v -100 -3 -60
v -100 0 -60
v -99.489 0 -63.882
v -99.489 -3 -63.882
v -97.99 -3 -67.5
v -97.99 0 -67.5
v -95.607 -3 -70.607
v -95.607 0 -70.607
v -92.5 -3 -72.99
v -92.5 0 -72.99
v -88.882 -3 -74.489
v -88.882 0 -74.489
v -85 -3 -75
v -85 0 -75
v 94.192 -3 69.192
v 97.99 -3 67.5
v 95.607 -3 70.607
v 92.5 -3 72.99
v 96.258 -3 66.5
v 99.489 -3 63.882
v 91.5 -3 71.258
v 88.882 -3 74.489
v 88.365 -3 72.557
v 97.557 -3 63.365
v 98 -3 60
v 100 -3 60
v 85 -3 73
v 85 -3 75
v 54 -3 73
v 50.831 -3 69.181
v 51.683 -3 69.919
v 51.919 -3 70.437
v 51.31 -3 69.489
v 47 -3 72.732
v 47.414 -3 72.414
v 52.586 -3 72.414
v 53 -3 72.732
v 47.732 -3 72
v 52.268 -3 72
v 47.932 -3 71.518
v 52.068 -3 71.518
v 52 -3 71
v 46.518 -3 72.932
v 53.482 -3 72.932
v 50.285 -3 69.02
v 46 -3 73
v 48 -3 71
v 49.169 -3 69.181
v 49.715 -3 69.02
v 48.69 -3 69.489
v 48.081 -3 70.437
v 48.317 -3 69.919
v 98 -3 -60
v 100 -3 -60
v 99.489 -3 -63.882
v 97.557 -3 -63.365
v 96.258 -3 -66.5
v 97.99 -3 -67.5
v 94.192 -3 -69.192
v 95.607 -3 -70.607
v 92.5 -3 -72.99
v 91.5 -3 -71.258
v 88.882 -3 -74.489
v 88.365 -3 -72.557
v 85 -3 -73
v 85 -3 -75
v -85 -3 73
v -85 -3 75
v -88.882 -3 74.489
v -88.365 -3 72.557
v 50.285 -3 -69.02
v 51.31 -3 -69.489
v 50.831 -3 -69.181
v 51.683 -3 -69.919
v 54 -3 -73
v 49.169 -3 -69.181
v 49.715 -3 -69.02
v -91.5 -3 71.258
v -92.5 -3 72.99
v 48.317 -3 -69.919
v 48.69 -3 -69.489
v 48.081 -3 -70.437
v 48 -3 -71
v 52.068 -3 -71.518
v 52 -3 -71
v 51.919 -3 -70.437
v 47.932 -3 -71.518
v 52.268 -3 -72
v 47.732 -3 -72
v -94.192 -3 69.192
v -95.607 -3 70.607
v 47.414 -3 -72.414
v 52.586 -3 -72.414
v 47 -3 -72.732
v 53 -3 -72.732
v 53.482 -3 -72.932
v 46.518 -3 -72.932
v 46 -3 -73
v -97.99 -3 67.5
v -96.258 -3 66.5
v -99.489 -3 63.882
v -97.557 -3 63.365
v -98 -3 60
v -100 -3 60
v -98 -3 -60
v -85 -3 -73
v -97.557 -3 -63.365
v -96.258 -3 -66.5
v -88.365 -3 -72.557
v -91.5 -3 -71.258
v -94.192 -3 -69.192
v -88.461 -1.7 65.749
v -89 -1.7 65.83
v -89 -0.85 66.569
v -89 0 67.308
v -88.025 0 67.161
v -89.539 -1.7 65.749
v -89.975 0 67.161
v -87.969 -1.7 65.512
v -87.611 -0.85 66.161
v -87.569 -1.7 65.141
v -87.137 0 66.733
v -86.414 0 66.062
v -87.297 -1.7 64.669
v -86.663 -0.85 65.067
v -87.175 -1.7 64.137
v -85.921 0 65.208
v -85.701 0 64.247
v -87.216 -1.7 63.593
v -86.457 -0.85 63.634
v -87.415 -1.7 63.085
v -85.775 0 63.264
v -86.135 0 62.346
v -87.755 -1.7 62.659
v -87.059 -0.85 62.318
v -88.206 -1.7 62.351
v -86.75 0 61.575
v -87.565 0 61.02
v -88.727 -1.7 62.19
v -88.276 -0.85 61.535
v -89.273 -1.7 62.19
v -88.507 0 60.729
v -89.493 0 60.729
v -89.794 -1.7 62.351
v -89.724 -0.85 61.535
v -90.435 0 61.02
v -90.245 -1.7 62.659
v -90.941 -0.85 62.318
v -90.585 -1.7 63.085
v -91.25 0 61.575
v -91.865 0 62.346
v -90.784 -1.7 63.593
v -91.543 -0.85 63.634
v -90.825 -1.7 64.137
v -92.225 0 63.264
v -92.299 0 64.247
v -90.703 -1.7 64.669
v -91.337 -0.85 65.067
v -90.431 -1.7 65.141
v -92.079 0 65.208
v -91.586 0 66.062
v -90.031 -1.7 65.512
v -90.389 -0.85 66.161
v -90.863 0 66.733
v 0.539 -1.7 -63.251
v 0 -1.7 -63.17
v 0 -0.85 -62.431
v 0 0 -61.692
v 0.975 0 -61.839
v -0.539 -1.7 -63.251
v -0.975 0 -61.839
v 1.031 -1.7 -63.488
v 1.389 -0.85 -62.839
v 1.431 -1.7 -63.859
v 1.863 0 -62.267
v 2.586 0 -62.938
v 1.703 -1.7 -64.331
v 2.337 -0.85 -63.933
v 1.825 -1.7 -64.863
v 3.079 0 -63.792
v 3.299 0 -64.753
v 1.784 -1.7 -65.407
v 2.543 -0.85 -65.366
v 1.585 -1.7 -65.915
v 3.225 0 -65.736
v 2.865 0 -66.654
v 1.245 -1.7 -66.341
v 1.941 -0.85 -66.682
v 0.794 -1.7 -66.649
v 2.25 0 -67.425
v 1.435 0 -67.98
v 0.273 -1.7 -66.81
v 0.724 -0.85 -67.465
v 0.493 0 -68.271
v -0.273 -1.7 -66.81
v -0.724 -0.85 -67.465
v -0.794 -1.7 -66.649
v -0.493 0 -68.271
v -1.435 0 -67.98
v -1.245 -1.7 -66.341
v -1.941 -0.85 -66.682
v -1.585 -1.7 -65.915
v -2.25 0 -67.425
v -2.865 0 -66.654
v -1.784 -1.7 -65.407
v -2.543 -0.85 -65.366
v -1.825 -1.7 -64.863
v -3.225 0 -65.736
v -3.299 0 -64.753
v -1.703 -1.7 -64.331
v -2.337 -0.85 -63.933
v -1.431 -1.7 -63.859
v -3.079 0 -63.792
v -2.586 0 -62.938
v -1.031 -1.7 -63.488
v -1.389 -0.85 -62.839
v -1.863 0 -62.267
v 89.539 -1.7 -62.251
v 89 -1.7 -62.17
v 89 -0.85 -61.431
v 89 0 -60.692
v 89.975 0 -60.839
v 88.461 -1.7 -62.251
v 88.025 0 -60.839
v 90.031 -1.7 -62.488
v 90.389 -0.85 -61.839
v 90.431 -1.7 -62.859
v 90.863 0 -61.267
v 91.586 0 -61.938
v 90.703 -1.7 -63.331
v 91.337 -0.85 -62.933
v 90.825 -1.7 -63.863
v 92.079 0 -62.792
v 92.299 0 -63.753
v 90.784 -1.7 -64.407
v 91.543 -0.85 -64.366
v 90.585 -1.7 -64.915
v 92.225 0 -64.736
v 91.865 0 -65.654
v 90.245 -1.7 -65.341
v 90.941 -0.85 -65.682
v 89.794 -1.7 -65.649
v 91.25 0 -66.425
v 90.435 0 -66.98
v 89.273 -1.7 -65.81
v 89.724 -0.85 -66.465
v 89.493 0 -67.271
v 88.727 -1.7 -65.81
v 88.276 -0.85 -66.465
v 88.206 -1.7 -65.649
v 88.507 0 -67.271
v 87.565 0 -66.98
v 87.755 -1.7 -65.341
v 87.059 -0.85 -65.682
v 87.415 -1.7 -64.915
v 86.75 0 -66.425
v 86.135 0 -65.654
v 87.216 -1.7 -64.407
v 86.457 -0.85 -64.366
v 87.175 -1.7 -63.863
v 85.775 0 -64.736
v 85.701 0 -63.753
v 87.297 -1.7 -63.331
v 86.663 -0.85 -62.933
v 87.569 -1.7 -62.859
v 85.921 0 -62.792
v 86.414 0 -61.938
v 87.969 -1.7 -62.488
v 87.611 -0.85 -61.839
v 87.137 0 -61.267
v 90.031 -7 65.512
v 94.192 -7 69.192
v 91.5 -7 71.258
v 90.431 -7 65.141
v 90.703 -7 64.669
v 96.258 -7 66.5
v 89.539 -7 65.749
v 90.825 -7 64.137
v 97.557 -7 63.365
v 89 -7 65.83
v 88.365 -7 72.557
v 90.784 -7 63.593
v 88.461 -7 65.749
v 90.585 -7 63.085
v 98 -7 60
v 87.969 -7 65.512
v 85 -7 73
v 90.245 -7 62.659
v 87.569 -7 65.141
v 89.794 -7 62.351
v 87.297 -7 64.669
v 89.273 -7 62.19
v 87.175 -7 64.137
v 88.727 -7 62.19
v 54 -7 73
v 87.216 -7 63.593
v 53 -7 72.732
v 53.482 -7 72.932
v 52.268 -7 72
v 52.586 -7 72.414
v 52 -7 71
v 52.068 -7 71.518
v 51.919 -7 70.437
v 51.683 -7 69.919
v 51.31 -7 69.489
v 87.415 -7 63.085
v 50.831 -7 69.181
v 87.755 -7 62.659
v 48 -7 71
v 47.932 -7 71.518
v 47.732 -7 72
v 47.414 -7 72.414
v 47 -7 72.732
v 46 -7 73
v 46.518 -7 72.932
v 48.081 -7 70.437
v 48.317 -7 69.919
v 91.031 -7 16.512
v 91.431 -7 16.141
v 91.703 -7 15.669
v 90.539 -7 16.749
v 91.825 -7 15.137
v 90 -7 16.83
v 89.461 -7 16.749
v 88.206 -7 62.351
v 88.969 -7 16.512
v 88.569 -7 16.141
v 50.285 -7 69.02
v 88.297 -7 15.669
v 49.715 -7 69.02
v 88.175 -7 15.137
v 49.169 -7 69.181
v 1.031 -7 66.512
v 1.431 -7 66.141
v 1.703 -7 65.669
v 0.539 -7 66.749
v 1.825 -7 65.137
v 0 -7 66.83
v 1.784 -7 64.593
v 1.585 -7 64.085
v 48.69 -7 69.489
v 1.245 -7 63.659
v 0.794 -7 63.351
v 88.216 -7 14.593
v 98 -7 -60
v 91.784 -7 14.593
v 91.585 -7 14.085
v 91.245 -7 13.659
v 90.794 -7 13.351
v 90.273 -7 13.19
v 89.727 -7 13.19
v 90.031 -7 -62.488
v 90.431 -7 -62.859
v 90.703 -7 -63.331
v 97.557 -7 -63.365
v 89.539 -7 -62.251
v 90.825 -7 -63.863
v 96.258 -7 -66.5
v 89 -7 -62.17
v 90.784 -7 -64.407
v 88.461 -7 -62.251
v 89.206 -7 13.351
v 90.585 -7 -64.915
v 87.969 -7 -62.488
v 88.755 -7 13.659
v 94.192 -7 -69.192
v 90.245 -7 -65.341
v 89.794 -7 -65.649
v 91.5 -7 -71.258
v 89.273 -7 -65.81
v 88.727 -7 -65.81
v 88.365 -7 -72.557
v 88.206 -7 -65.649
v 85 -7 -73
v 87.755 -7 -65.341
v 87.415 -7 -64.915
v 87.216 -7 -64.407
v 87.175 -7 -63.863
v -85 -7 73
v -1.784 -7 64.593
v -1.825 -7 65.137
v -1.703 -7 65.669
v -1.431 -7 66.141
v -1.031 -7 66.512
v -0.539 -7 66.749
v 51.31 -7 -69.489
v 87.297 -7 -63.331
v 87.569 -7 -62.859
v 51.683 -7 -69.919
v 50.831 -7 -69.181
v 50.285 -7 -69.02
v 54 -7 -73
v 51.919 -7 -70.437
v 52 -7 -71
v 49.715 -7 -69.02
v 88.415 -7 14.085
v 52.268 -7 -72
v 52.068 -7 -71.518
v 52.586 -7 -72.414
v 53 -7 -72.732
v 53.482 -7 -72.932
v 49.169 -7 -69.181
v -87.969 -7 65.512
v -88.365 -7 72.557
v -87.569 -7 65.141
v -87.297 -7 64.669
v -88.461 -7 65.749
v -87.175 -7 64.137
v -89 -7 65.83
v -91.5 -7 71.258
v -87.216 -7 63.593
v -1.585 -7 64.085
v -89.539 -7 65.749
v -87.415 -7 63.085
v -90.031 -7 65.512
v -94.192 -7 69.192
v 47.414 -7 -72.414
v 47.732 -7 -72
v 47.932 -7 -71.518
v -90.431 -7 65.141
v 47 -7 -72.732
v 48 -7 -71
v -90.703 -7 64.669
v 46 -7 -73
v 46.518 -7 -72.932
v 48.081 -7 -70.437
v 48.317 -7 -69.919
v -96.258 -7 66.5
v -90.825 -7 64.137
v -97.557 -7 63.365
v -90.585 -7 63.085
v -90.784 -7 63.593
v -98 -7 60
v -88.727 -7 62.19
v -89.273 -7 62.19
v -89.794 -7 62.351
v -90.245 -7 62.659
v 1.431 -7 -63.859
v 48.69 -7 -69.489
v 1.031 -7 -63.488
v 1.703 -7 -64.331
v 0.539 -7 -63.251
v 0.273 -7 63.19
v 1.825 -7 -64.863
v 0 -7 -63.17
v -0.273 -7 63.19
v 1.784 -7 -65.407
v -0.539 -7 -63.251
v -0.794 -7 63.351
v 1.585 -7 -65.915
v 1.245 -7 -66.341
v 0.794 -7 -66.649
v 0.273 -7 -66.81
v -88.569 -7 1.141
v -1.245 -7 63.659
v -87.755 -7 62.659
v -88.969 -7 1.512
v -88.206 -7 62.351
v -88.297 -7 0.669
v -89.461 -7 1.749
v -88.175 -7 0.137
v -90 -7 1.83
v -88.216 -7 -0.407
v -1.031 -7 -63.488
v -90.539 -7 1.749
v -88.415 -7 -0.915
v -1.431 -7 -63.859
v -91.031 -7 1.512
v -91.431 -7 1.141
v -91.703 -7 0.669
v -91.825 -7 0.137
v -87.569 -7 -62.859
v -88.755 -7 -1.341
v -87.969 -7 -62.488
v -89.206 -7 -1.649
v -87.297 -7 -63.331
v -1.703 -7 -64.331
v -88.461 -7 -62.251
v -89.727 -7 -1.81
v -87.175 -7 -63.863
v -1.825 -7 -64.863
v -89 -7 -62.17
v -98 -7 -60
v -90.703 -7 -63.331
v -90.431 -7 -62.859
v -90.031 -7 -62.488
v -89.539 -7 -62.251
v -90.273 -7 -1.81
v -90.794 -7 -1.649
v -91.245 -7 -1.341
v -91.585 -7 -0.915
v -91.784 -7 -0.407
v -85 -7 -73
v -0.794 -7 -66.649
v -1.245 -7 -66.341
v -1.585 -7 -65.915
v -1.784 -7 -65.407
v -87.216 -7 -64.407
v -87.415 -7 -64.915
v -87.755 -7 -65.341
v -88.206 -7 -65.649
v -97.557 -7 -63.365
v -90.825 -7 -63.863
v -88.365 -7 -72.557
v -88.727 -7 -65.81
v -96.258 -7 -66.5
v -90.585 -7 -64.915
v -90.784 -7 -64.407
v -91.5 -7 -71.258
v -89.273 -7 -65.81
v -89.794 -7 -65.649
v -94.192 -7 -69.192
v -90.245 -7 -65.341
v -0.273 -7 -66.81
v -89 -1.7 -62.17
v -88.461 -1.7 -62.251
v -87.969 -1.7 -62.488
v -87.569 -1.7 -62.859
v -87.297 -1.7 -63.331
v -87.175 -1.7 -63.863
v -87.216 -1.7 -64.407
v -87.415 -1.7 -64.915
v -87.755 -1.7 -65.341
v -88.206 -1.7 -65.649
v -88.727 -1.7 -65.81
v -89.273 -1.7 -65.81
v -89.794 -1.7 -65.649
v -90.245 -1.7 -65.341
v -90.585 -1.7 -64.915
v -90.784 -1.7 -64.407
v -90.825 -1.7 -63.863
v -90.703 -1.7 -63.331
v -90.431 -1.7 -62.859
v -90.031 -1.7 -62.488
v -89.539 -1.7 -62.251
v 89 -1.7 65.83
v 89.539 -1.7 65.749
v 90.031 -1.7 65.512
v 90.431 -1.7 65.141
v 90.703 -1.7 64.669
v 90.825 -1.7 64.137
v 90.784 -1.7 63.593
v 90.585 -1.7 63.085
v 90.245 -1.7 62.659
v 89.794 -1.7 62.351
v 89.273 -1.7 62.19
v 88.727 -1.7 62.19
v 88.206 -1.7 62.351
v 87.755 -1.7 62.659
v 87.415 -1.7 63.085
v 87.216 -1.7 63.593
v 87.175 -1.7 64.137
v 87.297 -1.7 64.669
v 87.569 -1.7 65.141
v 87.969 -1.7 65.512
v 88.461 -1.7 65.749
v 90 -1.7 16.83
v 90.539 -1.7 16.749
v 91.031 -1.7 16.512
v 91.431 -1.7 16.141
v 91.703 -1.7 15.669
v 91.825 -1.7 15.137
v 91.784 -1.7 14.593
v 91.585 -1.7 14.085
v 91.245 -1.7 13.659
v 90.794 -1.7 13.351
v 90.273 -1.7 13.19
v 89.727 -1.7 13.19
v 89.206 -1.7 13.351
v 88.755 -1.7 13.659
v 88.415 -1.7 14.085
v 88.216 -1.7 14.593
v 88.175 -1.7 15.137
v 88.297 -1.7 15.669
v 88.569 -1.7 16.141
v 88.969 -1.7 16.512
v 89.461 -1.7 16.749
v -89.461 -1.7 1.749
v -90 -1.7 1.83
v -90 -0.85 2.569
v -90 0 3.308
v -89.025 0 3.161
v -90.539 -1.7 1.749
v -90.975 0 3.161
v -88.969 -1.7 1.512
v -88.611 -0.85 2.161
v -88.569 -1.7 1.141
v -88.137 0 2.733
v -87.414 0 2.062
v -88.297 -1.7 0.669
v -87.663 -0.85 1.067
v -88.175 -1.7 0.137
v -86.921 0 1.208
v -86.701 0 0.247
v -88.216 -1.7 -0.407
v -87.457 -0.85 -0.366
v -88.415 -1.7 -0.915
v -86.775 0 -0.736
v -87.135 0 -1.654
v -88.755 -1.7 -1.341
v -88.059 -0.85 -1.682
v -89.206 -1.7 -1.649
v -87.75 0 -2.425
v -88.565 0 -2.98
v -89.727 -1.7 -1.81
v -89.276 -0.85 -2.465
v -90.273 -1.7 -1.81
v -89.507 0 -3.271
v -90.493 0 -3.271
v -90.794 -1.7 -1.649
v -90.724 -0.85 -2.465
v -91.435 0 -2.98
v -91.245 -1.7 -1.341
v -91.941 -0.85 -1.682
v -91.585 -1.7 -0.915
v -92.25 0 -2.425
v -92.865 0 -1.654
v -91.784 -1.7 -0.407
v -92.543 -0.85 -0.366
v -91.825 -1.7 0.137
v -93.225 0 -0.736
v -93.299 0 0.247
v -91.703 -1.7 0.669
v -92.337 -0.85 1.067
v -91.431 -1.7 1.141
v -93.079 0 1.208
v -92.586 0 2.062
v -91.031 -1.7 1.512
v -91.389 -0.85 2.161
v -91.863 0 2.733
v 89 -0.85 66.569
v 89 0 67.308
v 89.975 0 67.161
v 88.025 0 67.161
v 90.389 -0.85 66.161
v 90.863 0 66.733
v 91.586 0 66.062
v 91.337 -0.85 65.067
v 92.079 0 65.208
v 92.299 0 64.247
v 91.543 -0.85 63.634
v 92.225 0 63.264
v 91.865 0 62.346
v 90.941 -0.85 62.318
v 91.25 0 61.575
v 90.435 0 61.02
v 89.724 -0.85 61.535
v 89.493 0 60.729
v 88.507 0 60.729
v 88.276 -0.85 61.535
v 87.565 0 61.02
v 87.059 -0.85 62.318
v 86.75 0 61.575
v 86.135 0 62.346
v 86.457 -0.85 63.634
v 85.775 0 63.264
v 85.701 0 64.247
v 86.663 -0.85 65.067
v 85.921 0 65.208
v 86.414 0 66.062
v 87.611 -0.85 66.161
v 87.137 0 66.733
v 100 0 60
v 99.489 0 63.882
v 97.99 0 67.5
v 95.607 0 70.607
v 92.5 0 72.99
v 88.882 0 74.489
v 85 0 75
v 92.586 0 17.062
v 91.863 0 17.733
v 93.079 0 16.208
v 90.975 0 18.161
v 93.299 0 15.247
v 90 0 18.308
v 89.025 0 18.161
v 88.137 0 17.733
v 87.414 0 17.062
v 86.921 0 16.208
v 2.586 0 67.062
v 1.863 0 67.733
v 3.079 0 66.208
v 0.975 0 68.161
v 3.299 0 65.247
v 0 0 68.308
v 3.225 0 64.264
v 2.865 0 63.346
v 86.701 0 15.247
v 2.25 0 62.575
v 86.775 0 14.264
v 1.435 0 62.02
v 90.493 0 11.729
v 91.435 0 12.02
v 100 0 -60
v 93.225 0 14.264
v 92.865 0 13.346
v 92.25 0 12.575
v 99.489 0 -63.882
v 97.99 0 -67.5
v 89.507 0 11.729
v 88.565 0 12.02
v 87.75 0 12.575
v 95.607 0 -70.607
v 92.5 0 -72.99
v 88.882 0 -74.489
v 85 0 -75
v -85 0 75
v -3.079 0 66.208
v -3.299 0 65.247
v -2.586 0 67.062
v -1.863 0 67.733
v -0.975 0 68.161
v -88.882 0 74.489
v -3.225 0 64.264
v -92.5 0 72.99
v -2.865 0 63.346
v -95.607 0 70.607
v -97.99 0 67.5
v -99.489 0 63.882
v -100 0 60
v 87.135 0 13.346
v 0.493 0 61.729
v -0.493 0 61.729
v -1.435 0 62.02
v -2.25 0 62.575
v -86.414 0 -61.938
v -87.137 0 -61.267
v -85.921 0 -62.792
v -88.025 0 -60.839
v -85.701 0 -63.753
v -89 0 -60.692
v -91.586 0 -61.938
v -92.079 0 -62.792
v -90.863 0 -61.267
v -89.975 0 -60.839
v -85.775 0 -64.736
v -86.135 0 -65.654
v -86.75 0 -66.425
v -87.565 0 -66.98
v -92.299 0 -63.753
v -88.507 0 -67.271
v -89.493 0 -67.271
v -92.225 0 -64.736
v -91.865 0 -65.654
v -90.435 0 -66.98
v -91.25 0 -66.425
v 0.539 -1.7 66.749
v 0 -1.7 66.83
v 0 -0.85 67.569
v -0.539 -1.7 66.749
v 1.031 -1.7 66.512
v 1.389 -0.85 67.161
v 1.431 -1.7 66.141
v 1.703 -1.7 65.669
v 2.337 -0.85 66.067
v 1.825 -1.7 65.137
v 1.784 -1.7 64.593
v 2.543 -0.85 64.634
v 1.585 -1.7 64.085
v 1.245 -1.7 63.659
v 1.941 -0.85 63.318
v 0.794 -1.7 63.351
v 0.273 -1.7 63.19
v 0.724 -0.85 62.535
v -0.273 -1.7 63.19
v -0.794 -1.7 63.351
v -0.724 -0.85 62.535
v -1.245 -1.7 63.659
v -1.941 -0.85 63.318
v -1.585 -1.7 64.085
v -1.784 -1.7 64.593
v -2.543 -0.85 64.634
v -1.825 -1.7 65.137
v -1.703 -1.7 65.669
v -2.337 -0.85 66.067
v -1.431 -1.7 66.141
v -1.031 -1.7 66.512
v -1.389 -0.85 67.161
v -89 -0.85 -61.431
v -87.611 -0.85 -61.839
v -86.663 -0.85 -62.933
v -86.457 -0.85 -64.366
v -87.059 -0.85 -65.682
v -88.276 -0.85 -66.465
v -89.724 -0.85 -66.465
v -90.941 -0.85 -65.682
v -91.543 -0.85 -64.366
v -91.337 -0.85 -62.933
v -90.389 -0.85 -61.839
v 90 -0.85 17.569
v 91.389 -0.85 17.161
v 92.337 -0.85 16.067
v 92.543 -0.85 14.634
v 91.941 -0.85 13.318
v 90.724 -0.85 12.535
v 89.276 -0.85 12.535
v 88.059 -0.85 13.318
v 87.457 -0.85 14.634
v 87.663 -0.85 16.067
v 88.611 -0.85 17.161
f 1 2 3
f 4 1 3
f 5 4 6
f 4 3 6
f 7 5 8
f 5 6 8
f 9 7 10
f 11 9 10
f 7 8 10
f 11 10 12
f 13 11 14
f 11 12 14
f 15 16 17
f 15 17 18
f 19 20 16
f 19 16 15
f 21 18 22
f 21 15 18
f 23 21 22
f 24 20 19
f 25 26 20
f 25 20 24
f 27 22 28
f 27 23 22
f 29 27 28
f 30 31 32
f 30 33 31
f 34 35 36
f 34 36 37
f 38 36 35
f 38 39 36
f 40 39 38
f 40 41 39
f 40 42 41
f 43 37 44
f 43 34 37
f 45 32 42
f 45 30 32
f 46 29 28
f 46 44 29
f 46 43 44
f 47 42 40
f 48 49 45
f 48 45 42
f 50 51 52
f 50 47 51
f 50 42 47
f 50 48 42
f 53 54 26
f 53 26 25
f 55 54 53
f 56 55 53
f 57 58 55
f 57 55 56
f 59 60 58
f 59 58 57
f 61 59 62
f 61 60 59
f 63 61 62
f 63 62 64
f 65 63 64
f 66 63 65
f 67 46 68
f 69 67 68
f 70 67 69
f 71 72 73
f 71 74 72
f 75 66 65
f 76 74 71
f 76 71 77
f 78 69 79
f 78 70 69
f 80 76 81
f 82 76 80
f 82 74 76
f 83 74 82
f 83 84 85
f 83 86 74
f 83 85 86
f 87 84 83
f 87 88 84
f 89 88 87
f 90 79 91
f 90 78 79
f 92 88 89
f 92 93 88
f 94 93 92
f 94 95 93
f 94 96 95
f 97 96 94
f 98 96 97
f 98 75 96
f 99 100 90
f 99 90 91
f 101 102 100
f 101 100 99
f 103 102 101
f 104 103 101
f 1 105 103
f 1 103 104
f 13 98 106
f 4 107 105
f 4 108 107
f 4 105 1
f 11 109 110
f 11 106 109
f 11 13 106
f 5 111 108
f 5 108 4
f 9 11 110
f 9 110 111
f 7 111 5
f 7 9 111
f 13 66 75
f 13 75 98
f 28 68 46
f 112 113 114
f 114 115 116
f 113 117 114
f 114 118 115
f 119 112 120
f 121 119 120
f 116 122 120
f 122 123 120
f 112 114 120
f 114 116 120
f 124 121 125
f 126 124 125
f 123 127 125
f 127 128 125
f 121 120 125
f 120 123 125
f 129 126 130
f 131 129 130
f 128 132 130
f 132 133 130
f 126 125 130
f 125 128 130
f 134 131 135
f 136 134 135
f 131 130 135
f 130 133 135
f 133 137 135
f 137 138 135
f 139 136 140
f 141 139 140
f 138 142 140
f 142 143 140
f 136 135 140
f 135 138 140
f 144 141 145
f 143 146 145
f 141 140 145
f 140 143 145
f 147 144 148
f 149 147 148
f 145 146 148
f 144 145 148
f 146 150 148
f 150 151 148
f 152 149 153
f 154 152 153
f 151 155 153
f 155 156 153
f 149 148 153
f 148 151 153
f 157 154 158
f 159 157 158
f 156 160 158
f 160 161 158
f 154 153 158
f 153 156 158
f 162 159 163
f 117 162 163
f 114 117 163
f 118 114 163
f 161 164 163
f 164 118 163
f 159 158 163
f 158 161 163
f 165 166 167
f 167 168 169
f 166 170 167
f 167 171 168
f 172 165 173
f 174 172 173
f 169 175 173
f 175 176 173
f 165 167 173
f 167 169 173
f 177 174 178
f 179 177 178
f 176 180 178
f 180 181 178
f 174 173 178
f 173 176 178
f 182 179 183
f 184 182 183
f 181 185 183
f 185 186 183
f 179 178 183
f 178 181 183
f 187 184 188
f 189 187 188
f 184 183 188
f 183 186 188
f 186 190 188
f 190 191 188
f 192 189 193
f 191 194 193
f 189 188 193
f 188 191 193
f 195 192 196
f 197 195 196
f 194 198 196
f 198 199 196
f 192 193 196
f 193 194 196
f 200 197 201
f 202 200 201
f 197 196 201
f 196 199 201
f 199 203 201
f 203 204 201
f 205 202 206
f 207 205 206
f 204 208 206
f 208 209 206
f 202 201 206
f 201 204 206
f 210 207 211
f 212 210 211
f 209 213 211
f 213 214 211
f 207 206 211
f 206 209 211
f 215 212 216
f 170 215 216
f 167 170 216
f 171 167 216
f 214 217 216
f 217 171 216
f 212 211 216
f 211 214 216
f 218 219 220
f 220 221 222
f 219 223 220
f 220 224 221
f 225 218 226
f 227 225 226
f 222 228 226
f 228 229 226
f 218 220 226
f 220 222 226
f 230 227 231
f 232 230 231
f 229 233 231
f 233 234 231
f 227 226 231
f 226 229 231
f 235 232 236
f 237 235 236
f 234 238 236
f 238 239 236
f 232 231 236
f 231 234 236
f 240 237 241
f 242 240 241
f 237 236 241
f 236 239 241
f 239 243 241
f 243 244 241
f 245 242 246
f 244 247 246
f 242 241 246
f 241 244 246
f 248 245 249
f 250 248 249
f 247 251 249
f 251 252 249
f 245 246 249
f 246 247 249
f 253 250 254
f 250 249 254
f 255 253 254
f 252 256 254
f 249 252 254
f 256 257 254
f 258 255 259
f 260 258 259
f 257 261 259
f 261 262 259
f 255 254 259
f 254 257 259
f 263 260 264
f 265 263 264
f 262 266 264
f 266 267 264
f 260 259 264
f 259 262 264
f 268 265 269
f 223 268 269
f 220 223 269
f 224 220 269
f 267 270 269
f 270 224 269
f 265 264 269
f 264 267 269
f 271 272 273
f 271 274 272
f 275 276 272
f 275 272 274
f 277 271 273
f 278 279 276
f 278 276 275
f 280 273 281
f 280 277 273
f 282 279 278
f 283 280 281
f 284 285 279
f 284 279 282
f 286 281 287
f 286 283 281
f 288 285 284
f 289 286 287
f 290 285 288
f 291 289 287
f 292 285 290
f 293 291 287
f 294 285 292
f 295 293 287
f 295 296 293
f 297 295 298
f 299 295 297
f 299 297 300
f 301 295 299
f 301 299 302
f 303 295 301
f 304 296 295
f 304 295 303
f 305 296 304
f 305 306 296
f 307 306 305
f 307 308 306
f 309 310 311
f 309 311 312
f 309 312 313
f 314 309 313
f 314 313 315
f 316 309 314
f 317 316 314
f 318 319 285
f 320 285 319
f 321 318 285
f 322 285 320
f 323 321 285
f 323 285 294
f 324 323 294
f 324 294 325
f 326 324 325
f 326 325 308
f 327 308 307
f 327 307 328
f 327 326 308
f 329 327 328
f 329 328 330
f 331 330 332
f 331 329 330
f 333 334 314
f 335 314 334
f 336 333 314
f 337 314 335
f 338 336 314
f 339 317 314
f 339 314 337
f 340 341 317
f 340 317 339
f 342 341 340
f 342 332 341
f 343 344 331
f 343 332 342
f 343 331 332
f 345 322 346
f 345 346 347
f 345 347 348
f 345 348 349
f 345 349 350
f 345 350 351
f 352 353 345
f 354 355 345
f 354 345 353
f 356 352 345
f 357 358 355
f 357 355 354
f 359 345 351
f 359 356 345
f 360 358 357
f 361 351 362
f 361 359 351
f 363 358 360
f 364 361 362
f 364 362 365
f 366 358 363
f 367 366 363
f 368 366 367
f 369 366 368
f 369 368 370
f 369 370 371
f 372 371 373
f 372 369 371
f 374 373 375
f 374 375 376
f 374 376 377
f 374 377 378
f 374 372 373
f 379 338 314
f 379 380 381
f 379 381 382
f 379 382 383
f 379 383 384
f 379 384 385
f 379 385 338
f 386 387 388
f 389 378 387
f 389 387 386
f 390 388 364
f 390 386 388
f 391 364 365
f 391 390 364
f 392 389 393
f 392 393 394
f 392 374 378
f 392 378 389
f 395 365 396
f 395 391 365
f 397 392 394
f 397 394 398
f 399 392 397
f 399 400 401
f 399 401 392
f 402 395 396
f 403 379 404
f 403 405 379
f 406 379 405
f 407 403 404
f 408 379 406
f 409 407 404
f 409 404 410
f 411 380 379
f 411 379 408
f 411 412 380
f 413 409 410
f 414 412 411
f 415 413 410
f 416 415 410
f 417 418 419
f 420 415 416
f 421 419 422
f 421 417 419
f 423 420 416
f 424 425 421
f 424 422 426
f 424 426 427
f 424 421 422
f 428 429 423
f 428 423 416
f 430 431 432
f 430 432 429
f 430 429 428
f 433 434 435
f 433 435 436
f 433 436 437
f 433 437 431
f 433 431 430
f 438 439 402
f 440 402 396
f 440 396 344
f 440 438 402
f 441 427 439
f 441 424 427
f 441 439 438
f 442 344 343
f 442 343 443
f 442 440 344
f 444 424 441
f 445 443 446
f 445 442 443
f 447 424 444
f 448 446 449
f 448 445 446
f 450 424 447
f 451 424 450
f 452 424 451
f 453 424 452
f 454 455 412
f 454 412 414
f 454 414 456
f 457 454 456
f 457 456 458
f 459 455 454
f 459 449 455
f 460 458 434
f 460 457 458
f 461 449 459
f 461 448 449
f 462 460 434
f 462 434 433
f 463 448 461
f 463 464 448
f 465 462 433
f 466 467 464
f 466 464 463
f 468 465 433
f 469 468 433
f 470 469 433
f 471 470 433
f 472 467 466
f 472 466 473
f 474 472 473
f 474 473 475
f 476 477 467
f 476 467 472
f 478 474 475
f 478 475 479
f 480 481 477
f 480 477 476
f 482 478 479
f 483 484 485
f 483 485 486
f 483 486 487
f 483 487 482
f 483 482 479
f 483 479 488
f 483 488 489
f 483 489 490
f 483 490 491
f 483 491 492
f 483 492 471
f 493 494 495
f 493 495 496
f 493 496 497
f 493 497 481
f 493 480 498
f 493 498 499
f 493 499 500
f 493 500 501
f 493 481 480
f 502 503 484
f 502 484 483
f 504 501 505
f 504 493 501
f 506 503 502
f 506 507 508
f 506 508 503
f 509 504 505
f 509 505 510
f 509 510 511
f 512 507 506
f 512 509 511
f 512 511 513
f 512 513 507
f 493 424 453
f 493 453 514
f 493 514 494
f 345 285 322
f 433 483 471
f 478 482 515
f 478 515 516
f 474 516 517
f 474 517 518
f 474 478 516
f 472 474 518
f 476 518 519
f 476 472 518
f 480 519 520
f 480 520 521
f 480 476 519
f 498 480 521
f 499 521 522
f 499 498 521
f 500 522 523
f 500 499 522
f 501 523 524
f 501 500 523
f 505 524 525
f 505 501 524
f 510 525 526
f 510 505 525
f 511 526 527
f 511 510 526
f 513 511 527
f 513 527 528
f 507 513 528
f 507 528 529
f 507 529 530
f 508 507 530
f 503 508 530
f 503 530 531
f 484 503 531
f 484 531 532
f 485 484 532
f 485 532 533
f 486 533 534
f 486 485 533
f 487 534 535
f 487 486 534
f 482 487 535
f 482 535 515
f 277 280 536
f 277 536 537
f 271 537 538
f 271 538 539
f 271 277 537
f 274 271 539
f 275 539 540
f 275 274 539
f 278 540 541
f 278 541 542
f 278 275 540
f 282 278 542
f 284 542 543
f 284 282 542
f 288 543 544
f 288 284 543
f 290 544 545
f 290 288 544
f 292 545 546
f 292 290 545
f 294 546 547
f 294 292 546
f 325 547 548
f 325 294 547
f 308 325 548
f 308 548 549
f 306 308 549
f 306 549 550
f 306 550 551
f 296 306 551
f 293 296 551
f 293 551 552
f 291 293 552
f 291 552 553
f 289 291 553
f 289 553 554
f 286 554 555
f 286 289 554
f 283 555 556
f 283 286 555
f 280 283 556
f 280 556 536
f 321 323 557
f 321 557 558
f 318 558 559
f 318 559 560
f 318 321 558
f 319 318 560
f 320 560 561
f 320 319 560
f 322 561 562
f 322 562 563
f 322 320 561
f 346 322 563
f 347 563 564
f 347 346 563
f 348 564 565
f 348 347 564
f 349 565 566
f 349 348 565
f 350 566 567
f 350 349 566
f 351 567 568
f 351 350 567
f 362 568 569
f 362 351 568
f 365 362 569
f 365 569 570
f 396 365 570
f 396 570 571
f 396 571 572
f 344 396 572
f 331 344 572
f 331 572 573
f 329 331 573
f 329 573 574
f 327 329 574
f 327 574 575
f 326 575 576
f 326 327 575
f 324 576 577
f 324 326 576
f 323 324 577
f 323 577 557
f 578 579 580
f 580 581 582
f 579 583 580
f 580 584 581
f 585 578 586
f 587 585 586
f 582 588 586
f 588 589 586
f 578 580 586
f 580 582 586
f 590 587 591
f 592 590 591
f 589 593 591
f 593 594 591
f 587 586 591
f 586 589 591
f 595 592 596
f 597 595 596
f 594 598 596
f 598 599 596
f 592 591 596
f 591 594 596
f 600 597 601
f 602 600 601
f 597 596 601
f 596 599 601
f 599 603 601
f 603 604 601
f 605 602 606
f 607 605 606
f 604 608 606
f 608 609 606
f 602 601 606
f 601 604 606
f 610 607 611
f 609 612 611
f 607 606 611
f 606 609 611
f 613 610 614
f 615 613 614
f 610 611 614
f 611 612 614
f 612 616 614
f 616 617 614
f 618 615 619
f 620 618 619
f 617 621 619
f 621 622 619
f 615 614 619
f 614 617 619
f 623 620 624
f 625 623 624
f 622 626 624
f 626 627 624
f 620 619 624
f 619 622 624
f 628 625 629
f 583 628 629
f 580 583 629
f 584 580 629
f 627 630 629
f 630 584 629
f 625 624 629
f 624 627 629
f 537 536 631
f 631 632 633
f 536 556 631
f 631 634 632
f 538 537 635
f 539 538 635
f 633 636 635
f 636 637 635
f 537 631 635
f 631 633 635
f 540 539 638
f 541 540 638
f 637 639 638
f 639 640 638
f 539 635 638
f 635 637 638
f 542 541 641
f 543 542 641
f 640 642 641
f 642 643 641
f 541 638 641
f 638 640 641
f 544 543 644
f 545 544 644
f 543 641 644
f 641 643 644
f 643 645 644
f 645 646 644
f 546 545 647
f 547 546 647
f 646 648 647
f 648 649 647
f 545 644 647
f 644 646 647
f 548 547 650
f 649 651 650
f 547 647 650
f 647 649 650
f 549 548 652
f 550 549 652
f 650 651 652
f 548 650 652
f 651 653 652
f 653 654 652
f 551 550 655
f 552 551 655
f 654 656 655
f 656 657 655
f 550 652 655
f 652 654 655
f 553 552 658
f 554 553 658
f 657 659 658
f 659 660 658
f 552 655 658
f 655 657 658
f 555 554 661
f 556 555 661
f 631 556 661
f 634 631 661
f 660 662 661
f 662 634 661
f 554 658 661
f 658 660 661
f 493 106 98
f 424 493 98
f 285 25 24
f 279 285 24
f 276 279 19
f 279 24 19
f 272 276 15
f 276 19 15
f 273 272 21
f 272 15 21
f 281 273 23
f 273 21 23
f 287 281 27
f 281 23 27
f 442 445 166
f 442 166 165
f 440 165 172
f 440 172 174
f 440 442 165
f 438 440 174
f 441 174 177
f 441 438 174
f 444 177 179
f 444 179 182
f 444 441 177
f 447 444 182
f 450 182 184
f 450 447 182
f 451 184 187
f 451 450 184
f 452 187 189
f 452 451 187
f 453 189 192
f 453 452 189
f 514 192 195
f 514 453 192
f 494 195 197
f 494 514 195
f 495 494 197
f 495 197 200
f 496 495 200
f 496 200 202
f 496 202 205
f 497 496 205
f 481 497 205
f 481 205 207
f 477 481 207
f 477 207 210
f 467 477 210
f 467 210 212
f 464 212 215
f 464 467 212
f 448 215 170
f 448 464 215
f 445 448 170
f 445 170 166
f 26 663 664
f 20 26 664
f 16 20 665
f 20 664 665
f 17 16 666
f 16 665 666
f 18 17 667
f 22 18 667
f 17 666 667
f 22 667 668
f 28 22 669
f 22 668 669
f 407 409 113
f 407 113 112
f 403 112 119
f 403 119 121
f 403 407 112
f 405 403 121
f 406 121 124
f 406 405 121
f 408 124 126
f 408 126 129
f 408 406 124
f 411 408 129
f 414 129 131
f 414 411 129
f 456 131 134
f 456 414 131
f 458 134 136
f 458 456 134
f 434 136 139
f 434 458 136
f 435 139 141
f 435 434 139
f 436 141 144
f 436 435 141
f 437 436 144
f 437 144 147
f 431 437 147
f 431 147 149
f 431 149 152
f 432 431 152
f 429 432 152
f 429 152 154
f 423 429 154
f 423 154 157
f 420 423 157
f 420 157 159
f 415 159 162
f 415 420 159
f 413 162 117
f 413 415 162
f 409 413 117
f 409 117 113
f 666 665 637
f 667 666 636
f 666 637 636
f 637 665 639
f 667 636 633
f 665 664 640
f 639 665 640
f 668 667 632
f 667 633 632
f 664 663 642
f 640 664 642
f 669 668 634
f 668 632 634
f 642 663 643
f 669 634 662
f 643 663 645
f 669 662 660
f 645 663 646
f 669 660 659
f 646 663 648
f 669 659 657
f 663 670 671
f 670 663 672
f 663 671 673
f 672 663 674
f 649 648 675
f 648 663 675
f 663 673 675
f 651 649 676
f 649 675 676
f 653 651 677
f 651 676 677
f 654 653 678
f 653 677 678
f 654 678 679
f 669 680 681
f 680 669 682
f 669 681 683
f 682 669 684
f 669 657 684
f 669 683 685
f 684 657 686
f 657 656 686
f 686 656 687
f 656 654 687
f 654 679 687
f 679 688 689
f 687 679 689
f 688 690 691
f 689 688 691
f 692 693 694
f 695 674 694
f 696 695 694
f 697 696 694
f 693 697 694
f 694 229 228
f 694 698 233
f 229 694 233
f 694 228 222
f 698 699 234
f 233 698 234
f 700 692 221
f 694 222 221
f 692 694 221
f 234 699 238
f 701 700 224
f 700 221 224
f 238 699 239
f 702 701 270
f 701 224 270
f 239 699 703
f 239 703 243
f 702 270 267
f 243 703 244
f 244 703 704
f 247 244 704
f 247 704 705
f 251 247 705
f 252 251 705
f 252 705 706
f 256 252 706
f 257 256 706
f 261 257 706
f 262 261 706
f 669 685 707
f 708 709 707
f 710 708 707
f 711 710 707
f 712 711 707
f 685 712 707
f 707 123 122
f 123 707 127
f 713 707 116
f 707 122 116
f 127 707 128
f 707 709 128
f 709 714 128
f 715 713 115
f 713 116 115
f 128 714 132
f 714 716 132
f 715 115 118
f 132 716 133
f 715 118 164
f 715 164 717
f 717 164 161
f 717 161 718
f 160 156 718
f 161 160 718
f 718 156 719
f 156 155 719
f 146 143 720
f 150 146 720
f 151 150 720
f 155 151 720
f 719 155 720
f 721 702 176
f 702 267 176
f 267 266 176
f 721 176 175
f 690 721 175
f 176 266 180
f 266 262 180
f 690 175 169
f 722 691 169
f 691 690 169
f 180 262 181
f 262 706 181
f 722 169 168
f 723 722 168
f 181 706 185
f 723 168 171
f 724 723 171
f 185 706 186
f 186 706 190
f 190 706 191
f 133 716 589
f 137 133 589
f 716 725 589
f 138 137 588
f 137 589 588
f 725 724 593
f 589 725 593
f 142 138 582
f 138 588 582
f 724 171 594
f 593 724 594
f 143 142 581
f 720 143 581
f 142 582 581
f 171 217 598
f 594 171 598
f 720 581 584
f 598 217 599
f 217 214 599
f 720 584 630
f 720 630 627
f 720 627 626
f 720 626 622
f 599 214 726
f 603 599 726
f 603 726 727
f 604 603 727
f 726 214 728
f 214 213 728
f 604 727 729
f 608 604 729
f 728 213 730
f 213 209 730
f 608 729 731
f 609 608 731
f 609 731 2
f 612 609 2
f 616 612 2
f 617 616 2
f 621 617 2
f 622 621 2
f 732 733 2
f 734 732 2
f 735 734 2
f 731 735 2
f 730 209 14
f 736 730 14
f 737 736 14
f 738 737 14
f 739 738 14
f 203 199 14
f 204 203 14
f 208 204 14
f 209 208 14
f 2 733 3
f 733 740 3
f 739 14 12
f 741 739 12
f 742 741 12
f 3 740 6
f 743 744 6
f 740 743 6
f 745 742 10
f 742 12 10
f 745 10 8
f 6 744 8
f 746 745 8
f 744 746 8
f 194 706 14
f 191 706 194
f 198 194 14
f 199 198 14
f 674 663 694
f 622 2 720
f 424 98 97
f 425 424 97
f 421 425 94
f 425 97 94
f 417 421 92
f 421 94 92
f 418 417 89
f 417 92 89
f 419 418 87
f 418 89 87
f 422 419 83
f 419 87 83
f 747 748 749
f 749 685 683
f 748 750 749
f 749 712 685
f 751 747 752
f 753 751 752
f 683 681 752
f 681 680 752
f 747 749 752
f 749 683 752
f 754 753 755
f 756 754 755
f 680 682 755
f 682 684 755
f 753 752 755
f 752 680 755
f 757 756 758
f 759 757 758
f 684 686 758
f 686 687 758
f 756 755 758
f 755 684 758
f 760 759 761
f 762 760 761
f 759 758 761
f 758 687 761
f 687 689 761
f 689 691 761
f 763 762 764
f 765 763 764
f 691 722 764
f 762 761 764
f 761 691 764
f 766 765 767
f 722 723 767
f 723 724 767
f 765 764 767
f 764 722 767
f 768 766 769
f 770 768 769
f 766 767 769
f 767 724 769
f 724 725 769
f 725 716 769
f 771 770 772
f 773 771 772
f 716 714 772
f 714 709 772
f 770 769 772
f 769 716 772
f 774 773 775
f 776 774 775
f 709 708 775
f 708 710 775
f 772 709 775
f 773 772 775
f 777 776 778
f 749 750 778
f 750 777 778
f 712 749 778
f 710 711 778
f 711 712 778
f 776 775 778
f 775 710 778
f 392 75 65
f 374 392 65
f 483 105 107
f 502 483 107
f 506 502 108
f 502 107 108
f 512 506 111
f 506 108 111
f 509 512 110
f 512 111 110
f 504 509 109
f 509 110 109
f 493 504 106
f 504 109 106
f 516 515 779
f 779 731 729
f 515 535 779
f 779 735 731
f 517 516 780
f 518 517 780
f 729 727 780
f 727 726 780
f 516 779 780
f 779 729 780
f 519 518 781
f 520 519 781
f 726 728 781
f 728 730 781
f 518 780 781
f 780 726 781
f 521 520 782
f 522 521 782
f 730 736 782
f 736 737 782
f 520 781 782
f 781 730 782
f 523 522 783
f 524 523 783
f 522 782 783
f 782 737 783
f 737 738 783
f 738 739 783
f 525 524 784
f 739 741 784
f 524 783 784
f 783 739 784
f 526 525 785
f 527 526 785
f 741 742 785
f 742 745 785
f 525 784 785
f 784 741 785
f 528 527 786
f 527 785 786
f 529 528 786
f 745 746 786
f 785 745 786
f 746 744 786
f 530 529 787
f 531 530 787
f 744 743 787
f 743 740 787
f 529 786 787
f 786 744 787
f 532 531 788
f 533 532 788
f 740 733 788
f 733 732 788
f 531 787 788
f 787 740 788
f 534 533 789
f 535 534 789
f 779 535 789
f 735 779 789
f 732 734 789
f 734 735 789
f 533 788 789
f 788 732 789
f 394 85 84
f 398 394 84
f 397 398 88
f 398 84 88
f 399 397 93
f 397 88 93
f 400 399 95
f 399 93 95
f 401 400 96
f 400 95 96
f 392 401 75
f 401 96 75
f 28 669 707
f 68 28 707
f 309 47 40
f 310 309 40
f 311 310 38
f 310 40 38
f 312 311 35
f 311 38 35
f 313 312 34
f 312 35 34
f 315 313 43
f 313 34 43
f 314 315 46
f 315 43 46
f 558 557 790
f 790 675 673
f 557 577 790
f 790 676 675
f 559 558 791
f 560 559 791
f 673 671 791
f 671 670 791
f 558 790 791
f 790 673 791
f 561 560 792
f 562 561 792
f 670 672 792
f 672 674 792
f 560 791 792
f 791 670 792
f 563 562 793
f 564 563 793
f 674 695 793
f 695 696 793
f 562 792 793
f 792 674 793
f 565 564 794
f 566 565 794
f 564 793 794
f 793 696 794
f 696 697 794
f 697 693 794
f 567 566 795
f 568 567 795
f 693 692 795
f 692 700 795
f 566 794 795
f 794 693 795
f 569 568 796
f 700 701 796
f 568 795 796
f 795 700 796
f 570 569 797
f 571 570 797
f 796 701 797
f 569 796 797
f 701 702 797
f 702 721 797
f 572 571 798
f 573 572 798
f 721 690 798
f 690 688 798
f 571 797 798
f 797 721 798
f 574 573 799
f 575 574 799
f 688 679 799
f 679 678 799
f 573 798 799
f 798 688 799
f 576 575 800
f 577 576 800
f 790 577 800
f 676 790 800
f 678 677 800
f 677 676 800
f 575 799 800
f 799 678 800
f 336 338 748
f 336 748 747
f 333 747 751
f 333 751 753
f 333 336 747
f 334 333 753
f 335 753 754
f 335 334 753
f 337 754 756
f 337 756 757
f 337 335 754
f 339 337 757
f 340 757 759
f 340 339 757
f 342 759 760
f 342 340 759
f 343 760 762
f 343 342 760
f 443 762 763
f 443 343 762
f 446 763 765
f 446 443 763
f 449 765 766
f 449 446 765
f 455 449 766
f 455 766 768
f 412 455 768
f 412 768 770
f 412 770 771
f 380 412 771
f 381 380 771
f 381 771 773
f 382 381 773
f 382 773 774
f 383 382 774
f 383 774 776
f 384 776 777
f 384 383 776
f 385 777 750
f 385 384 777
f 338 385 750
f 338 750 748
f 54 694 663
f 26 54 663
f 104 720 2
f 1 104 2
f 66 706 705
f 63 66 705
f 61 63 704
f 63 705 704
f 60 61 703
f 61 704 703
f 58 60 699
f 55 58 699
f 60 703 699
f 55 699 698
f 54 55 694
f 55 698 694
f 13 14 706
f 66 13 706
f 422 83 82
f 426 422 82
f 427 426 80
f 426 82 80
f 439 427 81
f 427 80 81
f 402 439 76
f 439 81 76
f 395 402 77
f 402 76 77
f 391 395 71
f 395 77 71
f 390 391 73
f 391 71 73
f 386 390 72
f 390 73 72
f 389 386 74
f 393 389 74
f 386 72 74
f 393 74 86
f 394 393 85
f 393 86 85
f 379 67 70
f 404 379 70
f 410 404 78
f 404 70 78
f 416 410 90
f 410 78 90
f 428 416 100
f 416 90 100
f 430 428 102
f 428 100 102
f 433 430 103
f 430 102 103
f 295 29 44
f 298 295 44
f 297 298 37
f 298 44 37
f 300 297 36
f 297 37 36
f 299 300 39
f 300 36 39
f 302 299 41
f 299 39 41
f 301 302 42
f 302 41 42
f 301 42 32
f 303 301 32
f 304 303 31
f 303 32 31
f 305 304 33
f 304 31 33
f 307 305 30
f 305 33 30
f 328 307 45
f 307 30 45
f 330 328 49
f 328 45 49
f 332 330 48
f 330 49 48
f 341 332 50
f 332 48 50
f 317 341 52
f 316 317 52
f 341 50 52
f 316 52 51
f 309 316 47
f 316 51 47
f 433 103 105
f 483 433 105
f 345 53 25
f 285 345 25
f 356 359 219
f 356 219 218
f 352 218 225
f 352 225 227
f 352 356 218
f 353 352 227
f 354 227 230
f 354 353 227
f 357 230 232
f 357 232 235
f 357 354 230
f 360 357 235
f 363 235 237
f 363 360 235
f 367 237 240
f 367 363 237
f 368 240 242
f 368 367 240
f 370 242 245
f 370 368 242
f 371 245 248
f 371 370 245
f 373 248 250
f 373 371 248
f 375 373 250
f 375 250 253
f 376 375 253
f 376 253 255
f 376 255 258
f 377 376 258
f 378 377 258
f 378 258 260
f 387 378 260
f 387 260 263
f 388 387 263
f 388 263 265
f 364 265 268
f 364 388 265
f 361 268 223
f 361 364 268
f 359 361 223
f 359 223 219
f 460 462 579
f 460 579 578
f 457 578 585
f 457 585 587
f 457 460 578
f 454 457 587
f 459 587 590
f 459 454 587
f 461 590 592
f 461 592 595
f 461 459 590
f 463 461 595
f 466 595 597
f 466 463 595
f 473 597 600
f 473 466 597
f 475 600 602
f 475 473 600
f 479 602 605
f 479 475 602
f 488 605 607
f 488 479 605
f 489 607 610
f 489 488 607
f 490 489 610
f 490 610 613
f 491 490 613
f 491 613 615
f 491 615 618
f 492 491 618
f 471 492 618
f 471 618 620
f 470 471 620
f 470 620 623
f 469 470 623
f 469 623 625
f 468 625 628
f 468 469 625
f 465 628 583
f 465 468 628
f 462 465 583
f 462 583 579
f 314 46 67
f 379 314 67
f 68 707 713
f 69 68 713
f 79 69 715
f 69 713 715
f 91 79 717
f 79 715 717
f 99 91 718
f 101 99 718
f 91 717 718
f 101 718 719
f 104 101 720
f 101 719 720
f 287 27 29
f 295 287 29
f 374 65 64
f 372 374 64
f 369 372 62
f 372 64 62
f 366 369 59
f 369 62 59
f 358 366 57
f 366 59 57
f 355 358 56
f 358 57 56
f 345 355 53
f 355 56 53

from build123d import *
from OCP.BRepFilletAPI import BRepFilletAPI_MakeChamfer

# Parameters (mm, degrees)
BASE_PLATE_DEPTH         = 3
INNER_START              = -3
INNER_BASE_PROFILE_DEPTH = 4
MOUNTING_START           = -7
BASEPLATE_5_R            = 1.83
MOUNTING_HOLES_DEPTH     = 7
COUNTERSINK_SIZE         = 1.7
COUNTERSINK_SIZE2        = 1.477787454


with BuildPart() as part:
    # BasePlate → Base Plate (new body)
    with BuildSketch(Plane(origin=(0, 0, 0), x_dir=(1, 0, 0), z_dir=(0, 1, 0))):
        with BuildLine():
            Line((-85, 75), (85, 75))
            ThreePointArc((85, 75), (95.606601718, 70.606601718), (100, 60))
            Line((100, 60), (100, -60))
            ThreePointArc((100, -60), (95.606601718, -70.606601718), (85, -75))
            Line((85, -75), (-85, -75))
            ThreePointArc((-85, -75), (-95.606601718, -70.606601718), (-100, -60))
            Line((-100, -60), (-100, 60))
            ThreePointArc((-100, 60), (-95.606601718, 70.606601718), (-85, 75))
        make_face()
    extrude(amount=-BASE_PLATE_DEPTH)

    # BasePlate<4> → Inner Base Profile (add)
    with BuildSketch(Plane(origin=(0, 0, 0), x_dir=(1, 0, 0), z_dir=(0, 1, 0)).offset(INNER_START)):
        with BuildLine():
            Line((-85, 73), (46, 73))
            ThreePointArc((46, 73), (47.414213562, 72.414213562), (48, 71))
            ThreePointArc((48, 71), (50, 69), (52, 71))
            ThreePointArc((52, 71), (52.585786438, 72.414213562), (54, 73))
            Line((54, 73), (85, 73))
            ThreePointArc((85, 73), (94.192388155, 69.192388155), (98, 60))
            Line((98, 60), (98, -60))
            ThreePointArc((98, -60), (94.192388155, -69.192388155), (85, -73))
            Line((85, -73), (54, -73))
            ThreePointArc((54, -73), (52.585786438, -72.414213562), (52, -71))
            ThreePointArc((52, -71), (50, -69), (48, -71))
            ThreePointArc((48, -71), (47.414213562, -72.414213562), (46, -73))
            Line((46, -73), (-85, -73))
            ThreePointArc((-85, -73), (-94.192388155, -69.192388155), (-98, -60))
            Line((-98, -60), (-98, 60))
            ThreePointArc((-98, 60), (-94.192388155, 69.192388155), (-85, 73))
        make_face()
    extrude(amount=-INNER_BASE_PROFILE_DEPTH)

    # BasePlate<5> → Mounting Holes (cut)
    with BuildSketch(Plane(origin=(0, 0, 0), x_dir=(1, 0, 0), z_dir=(0, 1, 0)).offset(MOUNTING_START)):
        with Locations(Location((90, -15, 0), (0, 0, 270))):
            Circle(BASEPLATE_5_R)
        with Locations(Location((-89, 64, 0), (0, 0, 270))):
            Circle(BASEPLATE_5_R)
        with Locations(Location((89, 64, 0), (0, 0, 270))):
            Circle(BASEPLATE_5_R)
        with Locations(Location((89, -64, 0), (0, 0, 270))):
            Circle(BASEPLATE_5_R)
        with Locations(Location((-89, -64, 0), (0, 0, 270))):
            Circle(BASEPLATE_5_R)
        with Locations(Location((0, 65, 0), (0, 0, 270))):
            Circle(BASEPLATE_5_R)
        with Locations(Location((-90, 0, 0), (0, 0, 270))):
            Circle(BASEPLATE_5_R)
        with Locations(Location((0, -65, 0), (0, 0, 270))):
            Circle(BASEPLATE_5_R)
    extrude(amount=MOUNTING_HOLES_DEPTH, mode=Mode.SUBTRACT)

    # Countersink: one chamfer whose edges measure the first distance from different faces: ONE call of the kernel's chamfer builder (chamfer() names one face for all edges)
    countersink_edges_1 = [part.edges().sort_by_distance(p)[0] for p in [
        (-89, 0, 62.17),
    ]]
    countersink_side_1 = [part.faces().sort_by_distance(p)[0] for p in [
        (-89, -3.5, 62.17),
    ]]
    countersink_edges_2 = [part.edges().sort_by_distance(p)[0] for p in [
        (0, 0, -66.83),
    ]]
    countersink_side_2 = [part.faces().sort_by_distance(p)[0] for p in [
        (0, -3.5, -66.83),
    ]]
    countersink_edges_3 = [part.edges().sort_by_distance(p)[0] for p in [
        (89, 0, -65.83),
    ]]
    countersink_side_3 = [part.faces().sort_by_distance(p)[0] for p in [
        (89, -3.5, -65.83),
    ]]
    countersink_edges_4 = [part.edges().sort_by_distance(p)[0] for p in [
        (90, 0, 13.17),
    ]]
    countersink_side_4 = [part.faces().sort_by_distance(p)[0] for p in [
        (90, -3.5, 13.17),
    ]]
    countersink_edges_5 = [part.edges().sort_by_distance(p)[0] for p in [
        (89, 0, 62.17),
    ]]
    countersink_side_5 = [part.faces().sort_by_distance(p)[0] for p in [
        (89, -3.5, 62.17),
    ]]
    countersink_edges_6 = [part.edges().sort_by_distance(p)[0] for p in [
        (-90, 0, -1.83),
    ]]
    countersink_side_6 = [part.faces().sort_by_distance(p)[0] for p in [
        (-90, -3.5, -1.83),
    ]]
    countersink_edges_7 = [part.edges().sort_by_distance(p)[0] for p in [
        (-89, 0, -65.83),
    ]]
    countersink_side_7 = [part.faces().sort_by_distance(p)[0] for p in [
        (-89, -3.5, -65.83),
    ]]
    countersink_edges_8 = [part.edges().sort_by_distance(p)[0] for p in [
        (0, 0, 63.17),
    ]]
    countersink_side_8 = [part.faces().sort_by_distance(p)[0] for p in [
        (0, -3.5, 63.17),
    ]]
    countersink = BRepFilletAPI_MakeChamfer(part.part.solid().wrapped)
    for e in countersink_edges_1:
        countersink.Add(COUNTERSINK_SIZE, COUNTERSINK_SIZE2, e.wrapped, countersink_side_1[0].wrapped)  # the first distance lies on this face
    for e in countersink_edges_2:
        countersink.Add(COUNTERSINK_SIZE, COUNTERSINK_SIZE2, e.wrapped, countersink_side_2[0].wrapped)  # the first distance lies on this face
    for e in countersink_edges_3:
        countersink.Add(COUNTERSINK_SIZE, COUNTERSINK_SIZE2, e.wrapped, countersink_side_3[0].wrapped)  # the first distance lies on this face
    for e in countersink_edges_4:
        countersink.Add(COUNTERSINK_SIZE, COUNTERSINK_SIZE2, e.wrapped, countersink_side_4[0].wrapped)  # the first distance lies on this face
    for e in countersink_edges_5:
        countersink.Add(COUNTERSINK_SIZE, COUNTERSINK_SIZE2, e.wrapped, countersink_side_5[0].wrapped)  # the first distance lies on this face
    for e in countersink_edges_6:
        countersink.Add(COUNTERSINK_SIZE, COUNTERSINK_SIZE2, e.wrapped, countersink_side_6[0].wrapped)  # the first distance lies on this face
    for e in countersink_edges_7:
        countersink.Add(COUNTERSINK_SIZE, COUNTERSINK_SIZE2, e.wrapped, countersink_side_7[0].wrapped)  # the first distance lies on this face
    for e in countersink_edges_8:
        countersink.Add(COUNTERSINK_SIZE, COUNTERSINK_SIZE2, e.wrapped, countersink_side_8[0].wrapped)  # the first distance lies on this face
    add(Compound.cast(countersink.Shape()), mode=Mode.REPLACE)


solid = part.part
